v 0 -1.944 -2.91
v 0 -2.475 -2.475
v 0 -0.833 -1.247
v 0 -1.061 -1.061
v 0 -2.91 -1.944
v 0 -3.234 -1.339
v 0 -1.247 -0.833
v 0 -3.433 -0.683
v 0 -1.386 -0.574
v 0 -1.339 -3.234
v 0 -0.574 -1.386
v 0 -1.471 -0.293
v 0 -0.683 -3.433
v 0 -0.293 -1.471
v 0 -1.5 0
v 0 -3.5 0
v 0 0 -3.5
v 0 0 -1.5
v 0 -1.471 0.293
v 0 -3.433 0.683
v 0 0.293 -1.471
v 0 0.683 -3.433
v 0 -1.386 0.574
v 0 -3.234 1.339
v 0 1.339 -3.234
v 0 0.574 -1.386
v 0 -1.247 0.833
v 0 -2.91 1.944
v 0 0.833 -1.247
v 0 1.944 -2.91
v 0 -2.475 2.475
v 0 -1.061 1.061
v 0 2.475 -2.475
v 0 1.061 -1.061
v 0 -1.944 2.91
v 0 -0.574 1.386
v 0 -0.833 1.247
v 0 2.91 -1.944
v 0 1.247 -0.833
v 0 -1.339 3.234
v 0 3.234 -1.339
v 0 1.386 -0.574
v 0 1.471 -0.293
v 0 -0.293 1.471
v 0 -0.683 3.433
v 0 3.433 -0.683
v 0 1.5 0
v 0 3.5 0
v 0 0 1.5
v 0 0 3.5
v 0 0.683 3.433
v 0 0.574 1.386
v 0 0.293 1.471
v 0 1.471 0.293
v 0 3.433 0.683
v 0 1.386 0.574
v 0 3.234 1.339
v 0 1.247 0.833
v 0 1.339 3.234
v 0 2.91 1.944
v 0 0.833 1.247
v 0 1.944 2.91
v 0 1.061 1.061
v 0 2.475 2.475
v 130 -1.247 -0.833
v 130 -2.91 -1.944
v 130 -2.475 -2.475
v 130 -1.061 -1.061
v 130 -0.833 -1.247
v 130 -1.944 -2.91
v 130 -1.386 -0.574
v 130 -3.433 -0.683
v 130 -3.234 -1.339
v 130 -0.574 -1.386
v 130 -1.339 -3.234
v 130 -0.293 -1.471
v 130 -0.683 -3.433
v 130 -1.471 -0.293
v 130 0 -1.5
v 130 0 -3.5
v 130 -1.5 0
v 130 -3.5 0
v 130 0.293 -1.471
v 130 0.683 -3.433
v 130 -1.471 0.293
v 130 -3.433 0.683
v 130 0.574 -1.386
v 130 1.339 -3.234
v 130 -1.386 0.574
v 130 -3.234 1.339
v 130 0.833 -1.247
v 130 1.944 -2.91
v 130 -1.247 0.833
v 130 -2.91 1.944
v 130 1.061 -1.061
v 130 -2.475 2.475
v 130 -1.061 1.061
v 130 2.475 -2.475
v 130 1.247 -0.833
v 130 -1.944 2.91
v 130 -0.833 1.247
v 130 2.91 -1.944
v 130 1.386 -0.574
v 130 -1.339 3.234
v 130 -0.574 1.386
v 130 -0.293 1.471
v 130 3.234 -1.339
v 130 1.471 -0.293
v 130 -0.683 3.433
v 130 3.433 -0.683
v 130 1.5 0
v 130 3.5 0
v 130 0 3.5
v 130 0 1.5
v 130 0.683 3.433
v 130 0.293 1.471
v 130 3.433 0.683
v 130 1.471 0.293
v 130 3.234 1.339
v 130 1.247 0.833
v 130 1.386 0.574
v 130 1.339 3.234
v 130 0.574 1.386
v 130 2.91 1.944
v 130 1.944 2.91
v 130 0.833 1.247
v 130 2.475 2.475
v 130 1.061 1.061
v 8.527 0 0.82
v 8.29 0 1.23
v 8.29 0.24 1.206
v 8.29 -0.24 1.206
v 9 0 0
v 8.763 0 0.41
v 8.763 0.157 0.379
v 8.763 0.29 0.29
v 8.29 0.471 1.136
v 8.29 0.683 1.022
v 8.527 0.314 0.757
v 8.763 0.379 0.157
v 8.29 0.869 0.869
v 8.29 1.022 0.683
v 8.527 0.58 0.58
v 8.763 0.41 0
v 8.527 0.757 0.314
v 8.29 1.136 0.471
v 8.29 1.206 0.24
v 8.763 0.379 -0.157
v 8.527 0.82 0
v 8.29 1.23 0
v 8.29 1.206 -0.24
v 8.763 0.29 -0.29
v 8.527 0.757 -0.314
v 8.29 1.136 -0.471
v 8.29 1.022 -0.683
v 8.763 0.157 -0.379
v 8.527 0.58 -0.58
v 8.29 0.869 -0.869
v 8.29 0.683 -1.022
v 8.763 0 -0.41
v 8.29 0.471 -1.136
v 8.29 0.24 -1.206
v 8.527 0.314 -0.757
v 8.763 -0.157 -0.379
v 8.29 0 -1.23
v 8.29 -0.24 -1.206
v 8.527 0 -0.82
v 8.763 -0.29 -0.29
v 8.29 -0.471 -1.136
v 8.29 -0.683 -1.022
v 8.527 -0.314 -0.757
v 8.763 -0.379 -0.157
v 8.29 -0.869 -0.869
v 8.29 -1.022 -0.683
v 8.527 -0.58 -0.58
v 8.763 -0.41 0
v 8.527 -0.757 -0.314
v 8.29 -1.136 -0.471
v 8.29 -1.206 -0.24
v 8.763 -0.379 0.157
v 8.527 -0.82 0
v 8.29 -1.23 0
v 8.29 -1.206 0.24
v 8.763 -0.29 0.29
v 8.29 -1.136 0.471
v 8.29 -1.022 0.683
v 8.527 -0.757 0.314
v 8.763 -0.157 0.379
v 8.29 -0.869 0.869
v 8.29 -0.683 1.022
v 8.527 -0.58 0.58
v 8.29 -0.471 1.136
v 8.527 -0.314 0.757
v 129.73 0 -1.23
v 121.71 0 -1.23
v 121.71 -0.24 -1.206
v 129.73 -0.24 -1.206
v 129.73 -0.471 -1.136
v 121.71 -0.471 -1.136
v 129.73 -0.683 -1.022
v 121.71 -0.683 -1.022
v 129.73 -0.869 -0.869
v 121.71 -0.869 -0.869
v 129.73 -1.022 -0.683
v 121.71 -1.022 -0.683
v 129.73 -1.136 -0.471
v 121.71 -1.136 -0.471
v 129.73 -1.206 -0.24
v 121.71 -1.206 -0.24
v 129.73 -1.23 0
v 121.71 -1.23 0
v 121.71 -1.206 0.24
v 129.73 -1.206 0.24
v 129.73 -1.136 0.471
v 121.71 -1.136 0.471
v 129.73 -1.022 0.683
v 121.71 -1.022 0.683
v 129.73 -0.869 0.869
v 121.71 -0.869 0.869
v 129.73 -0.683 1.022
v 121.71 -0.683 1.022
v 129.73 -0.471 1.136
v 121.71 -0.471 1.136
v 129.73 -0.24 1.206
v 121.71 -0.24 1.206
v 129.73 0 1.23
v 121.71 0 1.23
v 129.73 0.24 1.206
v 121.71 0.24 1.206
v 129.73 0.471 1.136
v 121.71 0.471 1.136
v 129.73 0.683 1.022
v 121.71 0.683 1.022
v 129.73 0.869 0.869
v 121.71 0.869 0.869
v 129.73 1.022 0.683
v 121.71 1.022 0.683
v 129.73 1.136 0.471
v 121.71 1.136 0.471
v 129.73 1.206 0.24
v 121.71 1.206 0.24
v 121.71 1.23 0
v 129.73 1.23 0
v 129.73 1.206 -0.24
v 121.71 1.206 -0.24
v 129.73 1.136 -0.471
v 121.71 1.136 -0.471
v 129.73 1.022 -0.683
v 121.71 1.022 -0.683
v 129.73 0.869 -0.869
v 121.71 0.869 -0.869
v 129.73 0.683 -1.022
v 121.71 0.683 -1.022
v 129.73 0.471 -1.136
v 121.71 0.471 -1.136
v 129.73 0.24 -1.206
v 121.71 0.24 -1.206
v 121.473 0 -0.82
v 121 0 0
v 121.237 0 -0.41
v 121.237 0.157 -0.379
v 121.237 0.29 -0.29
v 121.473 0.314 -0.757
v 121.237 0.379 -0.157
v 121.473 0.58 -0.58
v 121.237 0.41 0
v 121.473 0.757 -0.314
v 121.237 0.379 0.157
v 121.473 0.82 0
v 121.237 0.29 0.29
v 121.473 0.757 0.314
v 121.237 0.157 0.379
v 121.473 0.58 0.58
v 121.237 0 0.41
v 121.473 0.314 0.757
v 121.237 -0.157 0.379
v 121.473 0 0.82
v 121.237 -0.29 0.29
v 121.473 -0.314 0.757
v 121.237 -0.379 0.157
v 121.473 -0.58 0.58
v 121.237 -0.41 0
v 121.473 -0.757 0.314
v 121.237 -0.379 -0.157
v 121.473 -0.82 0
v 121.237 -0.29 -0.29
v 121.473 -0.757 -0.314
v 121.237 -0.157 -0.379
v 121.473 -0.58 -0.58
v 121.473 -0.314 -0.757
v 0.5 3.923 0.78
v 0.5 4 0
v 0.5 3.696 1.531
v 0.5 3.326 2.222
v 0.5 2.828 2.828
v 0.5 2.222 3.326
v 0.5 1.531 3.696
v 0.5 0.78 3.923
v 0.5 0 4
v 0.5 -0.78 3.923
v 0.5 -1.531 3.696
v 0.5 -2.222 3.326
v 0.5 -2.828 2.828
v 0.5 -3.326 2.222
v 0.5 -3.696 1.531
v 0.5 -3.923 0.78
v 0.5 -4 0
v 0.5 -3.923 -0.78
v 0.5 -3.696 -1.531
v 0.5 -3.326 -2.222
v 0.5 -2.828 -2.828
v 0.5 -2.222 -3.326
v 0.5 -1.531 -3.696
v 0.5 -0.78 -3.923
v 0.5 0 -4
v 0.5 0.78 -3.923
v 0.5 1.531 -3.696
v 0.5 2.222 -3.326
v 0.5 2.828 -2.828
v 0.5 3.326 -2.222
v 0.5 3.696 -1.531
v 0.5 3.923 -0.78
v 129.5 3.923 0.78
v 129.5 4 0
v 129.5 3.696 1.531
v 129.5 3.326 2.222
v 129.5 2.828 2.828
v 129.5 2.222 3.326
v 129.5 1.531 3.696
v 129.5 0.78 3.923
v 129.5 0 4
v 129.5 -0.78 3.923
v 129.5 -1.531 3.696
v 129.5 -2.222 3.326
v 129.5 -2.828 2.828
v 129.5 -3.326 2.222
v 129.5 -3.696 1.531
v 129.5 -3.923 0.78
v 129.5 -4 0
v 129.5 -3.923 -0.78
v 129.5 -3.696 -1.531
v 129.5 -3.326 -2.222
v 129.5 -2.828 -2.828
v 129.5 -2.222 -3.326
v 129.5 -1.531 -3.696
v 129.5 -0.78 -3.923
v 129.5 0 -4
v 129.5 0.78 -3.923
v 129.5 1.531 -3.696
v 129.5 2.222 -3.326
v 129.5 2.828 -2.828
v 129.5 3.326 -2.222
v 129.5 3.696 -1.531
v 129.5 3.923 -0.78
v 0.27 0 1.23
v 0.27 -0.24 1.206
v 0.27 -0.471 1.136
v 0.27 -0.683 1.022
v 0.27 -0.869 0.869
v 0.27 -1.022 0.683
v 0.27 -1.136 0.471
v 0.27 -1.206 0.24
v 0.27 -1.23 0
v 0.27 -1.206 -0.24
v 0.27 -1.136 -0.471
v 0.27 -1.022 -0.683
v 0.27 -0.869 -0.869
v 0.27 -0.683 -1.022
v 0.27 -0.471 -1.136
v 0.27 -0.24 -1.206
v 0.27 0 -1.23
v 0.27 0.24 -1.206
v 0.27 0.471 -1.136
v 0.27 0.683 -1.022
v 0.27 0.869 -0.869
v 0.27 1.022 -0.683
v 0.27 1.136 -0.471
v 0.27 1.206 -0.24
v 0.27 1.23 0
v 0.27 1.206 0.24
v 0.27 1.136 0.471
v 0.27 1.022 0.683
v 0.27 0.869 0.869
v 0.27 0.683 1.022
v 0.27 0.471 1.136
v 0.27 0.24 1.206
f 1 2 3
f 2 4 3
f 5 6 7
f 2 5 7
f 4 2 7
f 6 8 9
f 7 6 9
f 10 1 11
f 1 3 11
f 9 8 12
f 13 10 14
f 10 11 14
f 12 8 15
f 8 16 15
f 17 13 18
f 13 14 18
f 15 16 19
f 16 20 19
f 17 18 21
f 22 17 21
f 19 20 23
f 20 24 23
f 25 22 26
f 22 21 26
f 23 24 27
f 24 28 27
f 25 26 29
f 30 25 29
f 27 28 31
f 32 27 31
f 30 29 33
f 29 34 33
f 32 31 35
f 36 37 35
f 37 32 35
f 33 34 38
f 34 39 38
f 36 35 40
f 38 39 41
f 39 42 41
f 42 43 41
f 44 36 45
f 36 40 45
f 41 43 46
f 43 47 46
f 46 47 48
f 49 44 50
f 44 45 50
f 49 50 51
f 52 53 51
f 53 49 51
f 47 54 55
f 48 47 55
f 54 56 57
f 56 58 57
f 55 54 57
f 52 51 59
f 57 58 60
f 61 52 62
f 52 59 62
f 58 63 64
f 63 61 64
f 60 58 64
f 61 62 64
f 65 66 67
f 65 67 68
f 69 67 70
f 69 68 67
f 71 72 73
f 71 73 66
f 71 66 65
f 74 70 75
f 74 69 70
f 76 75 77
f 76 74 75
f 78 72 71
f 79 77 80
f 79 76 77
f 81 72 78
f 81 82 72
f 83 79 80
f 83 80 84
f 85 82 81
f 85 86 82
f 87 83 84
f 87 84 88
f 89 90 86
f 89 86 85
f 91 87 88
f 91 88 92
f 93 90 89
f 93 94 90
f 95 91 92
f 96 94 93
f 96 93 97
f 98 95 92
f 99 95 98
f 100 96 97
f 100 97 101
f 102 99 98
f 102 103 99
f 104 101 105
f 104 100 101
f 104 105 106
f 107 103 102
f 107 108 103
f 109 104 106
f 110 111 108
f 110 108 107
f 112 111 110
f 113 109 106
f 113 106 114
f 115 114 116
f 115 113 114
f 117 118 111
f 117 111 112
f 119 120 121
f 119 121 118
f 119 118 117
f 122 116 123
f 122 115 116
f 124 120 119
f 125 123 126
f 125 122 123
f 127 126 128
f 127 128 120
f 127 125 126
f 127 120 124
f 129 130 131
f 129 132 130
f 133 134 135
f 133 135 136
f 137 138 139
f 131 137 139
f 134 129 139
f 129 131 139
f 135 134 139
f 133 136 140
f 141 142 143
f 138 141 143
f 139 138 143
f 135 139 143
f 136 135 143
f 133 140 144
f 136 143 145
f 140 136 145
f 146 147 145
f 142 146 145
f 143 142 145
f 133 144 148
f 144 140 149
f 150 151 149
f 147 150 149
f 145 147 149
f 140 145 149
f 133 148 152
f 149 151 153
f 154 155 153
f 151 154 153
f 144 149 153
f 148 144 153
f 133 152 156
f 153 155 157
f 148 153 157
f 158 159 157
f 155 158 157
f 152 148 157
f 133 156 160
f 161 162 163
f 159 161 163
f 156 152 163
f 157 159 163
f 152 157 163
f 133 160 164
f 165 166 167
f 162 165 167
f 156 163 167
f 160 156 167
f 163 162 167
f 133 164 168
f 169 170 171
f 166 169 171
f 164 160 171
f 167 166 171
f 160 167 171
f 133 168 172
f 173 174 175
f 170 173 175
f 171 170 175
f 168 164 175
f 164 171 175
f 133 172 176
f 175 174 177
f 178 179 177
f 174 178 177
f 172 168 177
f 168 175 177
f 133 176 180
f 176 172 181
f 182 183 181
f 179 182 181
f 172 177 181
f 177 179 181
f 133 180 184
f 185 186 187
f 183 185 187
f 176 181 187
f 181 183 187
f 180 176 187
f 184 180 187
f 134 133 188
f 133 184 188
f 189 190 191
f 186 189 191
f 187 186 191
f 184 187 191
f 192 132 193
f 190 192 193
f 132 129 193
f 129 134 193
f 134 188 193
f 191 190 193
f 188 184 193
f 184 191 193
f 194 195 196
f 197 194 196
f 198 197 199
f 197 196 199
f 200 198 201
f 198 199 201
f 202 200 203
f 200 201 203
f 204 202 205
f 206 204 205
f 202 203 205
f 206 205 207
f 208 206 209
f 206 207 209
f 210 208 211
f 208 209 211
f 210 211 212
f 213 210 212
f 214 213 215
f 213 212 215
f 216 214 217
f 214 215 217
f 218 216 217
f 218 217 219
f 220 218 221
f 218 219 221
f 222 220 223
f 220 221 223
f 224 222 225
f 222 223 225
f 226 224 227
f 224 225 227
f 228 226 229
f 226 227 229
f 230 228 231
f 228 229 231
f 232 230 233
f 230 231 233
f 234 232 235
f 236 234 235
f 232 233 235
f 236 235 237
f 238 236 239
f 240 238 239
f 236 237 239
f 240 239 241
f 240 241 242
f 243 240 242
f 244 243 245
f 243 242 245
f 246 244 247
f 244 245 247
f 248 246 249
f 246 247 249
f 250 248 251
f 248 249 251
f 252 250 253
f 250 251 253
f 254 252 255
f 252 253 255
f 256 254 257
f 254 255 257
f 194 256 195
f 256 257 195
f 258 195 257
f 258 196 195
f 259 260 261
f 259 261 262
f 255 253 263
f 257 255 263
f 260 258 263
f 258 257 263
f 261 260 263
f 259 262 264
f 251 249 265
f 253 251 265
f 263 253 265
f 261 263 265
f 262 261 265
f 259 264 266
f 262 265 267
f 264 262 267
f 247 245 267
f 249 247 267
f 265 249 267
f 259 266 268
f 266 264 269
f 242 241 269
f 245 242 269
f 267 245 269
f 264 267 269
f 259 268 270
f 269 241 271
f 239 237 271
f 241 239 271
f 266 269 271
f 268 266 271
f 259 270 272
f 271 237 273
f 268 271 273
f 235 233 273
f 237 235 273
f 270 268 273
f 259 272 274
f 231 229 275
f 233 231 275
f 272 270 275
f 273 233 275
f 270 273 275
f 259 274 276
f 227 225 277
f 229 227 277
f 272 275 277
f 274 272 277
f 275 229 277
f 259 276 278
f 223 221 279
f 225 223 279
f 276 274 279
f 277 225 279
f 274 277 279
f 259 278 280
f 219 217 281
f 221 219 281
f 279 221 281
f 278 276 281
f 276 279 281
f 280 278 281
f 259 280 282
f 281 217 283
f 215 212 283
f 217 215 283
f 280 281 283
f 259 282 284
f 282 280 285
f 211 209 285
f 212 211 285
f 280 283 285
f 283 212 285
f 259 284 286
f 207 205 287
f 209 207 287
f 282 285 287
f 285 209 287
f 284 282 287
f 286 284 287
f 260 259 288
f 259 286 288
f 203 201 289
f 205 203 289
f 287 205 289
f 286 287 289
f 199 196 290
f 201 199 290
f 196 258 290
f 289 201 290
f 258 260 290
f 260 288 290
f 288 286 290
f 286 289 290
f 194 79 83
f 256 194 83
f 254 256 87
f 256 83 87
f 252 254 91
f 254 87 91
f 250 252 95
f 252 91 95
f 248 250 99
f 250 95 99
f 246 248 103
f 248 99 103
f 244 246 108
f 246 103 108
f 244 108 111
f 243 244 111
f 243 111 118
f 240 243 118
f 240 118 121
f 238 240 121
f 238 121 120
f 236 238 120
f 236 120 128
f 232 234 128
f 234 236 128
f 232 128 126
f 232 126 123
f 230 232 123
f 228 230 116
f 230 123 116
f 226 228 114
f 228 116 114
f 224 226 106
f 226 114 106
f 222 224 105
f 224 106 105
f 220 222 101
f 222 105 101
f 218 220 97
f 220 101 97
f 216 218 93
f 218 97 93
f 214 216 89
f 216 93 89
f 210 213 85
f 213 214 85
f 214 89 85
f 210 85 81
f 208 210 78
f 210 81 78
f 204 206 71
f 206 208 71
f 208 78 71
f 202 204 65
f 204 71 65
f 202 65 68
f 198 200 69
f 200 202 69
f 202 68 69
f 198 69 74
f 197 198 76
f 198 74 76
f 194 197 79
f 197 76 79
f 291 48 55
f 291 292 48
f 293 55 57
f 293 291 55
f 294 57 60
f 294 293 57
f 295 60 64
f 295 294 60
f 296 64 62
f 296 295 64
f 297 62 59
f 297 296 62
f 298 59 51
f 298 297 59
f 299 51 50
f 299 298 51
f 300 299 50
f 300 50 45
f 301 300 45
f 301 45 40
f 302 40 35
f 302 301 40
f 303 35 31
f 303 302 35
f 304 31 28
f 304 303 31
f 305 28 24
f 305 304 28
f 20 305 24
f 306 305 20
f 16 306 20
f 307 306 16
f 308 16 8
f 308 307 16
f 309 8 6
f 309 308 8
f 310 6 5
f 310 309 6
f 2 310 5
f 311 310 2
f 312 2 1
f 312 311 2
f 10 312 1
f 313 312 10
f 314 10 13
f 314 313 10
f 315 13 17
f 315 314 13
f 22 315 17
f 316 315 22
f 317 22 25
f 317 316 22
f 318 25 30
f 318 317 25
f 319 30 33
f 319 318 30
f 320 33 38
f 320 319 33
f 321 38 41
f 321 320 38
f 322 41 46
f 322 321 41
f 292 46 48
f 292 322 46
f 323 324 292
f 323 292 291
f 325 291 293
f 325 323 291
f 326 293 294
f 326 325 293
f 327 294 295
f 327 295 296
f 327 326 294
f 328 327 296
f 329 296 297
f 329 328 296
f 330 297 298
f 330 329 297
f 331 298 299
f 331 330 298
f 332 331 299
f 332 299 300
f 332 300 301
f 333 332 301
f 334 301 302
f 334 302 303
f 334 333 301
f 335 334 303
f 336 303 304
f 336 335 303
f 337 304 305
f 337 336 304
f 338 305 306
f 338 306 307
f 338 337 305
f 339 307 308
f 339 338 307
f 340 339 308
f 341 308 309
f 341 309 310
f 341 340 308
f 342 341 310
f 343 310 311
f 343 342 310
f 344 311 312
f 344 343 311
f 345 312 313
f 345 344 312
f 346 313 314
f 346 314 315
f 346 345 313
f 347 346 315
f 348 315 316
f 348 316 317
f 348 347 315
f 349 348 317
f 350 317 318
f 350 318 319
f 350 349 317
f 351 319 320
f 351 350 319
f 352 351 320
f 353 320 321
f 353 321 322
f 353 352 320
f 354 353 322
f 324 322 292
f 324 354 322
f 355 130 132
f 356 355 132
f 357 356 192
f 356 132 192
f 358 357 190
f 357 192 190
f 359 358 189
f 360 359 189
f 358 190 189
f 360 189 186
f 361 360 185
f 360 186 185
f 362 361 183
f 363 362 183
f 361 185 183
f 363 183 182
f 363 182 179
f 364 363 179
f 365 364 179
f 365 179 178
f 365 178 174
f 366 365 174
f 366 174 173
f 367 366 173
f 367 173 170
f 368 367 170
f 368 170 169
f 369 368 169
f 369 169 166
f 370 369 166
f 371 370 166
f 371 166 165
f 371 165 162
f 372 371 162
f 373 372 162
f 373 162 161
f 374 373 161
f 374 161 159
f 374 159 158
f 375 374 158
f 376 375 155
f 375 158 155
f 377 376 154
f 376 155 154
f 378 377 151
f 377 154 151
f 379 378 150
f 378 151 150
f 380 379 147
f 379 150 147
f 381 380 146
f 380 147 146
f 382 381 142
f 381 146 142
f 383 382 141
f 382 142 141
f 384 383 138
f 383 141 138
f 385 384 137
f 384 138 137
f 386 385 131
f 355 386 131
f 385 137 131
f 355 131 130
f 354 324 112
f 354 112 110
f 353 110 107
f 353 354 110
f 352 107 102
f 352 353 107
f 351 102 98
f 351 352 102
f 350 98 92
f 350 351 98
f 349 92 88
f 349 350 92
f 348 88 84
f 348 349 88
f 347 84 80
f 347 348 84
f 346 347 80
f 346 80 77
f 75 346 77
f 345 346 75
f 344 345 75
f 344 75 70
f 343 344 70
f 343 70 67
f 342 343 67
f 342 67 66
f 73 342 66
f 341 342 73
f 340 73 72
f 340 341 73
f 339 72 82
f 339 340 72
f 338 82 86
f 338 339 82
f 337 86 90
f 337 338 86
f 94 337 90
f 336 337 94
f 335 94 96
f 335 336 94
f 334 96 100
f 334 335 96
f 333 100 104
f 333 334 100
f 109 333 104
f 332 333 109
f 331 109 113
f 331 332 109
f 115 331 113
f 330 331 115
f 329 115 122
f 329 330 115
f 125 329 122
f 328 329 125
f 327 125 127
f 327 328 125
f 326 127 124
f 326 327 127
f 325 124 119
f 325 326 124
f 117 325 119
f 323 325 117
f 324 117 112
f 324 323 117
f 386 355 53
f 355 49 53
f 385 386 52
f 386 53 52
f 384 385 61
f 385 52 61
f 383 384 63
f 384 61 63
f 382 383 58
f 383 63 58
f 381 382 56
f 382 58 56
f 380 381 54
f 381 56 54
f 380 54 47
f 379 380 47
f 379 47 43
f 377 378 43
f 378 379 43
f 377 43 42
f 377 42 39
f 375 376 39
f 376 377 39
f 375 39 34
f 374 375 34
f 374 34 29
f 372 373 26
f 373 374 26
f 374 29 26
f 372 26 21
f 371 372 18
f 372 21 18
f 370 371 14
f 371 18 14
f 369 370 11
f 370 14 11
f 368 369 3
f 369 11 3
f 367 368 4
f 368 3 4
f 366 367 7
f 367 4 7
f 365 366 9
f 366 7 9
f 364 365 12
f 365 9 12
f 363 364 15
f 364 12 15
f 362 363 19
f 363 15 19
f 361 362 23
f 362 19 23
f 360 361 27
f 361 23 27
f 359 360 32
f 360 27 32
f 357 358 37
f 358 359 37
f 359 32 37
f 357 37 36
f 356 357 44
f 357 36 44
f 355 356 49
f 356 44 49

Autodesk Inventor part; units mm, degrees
ref_plane "YZ Plane" through (0, 0, 0) normal (1, 0, 0) x (0, 1, 0)
ref_plane "XZ Plane" through (0, 0, 0) normal (0, 1, 0) x (-1, 0, 0)
ref_plane "XY Plane" through (0, 0, 0) normal (0, 0, 1) x (1, 0, 0)
sketch "Sketch_1" plane through (0, 0, 0) normal (0, 0, 1) x (1, 0, 0)
  line L0 (130, 0) -> (0, 0)
  line L1 (0, 0) -> (0, 3.5)
  line L2 (0, 3.5) -> (0.5, 4)
  line L3 (0.5, 4) -> (129.5, 4)
  line L4 (129.5, 4) -> (130, 3.5)
  line L5 (130, 3.5) -> (130, 0)
  line L6 (130, 0) -> (0, 0)
revolve "Revolution1" add sketch "Sketch_1" angle 360 about axis through (130, 0, 0) along (1, 0, 0)
sketch "Sketch2" plane through (0, 0, 0) normal (-1, 0, 0) x (0, 0, 1)
  point P0 (0, 0)
hole "Hole1" at (0, 0, 0) direction (1, 0, 0) diameter 2.459 depth 8.2901 tip angle 120 countersink diameter 3 countersink angle 90 thread size "M3x0.5" class "6H" standard "ISO Metric profile"
sketch "Sketch3" plane through (130, 0, 0) normal (1, 0, 0) x (0, 0, -1)
  point P0 (0, 0)
hole "Hole2" at (130, 0, 0) direction (-1, 0, 0) diameter 2.459 depth 8.2901 tip angle 120 countersink diameter 3 countersink angle 90 thread size "M3x0.5" class "6H" standard "ISO Metric profile"
properties part number "AETTF8-130-M3-N3"
